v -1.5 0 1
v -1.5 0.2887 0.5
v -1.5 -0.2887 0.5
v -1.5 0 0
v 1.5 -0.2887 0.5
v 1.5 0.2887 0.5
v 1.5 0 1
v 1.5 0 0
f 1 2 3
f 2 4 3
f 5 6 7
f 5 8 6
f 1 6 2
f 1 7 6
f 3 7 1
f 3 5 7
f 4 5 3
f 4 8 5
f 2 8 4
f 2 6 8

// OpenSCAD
// Rhombic Prism for Stacks of Shapes
// by Slashee the Cow

line_length = 0.5;
rhombus_angle = 60;
rhombus_height = line_length * sin(rhombus_angle);

module rhombus(side_length, angle) {
    height = side_length * sin(angle);
    half_width = side_length * cos(angle);
    points = [[0, 0], [half_width, height], [0, 2 * height], [-half_width, height]];
    polygon(points);
}
color("LimeGreen")
translate([-1.5,0,0])
rotate([0,90,0])
linear_extrude(3)
resize([1,0,0], auto = true)
rotate([0,0,90])
rhombus(line_length, rhombus_angle);
